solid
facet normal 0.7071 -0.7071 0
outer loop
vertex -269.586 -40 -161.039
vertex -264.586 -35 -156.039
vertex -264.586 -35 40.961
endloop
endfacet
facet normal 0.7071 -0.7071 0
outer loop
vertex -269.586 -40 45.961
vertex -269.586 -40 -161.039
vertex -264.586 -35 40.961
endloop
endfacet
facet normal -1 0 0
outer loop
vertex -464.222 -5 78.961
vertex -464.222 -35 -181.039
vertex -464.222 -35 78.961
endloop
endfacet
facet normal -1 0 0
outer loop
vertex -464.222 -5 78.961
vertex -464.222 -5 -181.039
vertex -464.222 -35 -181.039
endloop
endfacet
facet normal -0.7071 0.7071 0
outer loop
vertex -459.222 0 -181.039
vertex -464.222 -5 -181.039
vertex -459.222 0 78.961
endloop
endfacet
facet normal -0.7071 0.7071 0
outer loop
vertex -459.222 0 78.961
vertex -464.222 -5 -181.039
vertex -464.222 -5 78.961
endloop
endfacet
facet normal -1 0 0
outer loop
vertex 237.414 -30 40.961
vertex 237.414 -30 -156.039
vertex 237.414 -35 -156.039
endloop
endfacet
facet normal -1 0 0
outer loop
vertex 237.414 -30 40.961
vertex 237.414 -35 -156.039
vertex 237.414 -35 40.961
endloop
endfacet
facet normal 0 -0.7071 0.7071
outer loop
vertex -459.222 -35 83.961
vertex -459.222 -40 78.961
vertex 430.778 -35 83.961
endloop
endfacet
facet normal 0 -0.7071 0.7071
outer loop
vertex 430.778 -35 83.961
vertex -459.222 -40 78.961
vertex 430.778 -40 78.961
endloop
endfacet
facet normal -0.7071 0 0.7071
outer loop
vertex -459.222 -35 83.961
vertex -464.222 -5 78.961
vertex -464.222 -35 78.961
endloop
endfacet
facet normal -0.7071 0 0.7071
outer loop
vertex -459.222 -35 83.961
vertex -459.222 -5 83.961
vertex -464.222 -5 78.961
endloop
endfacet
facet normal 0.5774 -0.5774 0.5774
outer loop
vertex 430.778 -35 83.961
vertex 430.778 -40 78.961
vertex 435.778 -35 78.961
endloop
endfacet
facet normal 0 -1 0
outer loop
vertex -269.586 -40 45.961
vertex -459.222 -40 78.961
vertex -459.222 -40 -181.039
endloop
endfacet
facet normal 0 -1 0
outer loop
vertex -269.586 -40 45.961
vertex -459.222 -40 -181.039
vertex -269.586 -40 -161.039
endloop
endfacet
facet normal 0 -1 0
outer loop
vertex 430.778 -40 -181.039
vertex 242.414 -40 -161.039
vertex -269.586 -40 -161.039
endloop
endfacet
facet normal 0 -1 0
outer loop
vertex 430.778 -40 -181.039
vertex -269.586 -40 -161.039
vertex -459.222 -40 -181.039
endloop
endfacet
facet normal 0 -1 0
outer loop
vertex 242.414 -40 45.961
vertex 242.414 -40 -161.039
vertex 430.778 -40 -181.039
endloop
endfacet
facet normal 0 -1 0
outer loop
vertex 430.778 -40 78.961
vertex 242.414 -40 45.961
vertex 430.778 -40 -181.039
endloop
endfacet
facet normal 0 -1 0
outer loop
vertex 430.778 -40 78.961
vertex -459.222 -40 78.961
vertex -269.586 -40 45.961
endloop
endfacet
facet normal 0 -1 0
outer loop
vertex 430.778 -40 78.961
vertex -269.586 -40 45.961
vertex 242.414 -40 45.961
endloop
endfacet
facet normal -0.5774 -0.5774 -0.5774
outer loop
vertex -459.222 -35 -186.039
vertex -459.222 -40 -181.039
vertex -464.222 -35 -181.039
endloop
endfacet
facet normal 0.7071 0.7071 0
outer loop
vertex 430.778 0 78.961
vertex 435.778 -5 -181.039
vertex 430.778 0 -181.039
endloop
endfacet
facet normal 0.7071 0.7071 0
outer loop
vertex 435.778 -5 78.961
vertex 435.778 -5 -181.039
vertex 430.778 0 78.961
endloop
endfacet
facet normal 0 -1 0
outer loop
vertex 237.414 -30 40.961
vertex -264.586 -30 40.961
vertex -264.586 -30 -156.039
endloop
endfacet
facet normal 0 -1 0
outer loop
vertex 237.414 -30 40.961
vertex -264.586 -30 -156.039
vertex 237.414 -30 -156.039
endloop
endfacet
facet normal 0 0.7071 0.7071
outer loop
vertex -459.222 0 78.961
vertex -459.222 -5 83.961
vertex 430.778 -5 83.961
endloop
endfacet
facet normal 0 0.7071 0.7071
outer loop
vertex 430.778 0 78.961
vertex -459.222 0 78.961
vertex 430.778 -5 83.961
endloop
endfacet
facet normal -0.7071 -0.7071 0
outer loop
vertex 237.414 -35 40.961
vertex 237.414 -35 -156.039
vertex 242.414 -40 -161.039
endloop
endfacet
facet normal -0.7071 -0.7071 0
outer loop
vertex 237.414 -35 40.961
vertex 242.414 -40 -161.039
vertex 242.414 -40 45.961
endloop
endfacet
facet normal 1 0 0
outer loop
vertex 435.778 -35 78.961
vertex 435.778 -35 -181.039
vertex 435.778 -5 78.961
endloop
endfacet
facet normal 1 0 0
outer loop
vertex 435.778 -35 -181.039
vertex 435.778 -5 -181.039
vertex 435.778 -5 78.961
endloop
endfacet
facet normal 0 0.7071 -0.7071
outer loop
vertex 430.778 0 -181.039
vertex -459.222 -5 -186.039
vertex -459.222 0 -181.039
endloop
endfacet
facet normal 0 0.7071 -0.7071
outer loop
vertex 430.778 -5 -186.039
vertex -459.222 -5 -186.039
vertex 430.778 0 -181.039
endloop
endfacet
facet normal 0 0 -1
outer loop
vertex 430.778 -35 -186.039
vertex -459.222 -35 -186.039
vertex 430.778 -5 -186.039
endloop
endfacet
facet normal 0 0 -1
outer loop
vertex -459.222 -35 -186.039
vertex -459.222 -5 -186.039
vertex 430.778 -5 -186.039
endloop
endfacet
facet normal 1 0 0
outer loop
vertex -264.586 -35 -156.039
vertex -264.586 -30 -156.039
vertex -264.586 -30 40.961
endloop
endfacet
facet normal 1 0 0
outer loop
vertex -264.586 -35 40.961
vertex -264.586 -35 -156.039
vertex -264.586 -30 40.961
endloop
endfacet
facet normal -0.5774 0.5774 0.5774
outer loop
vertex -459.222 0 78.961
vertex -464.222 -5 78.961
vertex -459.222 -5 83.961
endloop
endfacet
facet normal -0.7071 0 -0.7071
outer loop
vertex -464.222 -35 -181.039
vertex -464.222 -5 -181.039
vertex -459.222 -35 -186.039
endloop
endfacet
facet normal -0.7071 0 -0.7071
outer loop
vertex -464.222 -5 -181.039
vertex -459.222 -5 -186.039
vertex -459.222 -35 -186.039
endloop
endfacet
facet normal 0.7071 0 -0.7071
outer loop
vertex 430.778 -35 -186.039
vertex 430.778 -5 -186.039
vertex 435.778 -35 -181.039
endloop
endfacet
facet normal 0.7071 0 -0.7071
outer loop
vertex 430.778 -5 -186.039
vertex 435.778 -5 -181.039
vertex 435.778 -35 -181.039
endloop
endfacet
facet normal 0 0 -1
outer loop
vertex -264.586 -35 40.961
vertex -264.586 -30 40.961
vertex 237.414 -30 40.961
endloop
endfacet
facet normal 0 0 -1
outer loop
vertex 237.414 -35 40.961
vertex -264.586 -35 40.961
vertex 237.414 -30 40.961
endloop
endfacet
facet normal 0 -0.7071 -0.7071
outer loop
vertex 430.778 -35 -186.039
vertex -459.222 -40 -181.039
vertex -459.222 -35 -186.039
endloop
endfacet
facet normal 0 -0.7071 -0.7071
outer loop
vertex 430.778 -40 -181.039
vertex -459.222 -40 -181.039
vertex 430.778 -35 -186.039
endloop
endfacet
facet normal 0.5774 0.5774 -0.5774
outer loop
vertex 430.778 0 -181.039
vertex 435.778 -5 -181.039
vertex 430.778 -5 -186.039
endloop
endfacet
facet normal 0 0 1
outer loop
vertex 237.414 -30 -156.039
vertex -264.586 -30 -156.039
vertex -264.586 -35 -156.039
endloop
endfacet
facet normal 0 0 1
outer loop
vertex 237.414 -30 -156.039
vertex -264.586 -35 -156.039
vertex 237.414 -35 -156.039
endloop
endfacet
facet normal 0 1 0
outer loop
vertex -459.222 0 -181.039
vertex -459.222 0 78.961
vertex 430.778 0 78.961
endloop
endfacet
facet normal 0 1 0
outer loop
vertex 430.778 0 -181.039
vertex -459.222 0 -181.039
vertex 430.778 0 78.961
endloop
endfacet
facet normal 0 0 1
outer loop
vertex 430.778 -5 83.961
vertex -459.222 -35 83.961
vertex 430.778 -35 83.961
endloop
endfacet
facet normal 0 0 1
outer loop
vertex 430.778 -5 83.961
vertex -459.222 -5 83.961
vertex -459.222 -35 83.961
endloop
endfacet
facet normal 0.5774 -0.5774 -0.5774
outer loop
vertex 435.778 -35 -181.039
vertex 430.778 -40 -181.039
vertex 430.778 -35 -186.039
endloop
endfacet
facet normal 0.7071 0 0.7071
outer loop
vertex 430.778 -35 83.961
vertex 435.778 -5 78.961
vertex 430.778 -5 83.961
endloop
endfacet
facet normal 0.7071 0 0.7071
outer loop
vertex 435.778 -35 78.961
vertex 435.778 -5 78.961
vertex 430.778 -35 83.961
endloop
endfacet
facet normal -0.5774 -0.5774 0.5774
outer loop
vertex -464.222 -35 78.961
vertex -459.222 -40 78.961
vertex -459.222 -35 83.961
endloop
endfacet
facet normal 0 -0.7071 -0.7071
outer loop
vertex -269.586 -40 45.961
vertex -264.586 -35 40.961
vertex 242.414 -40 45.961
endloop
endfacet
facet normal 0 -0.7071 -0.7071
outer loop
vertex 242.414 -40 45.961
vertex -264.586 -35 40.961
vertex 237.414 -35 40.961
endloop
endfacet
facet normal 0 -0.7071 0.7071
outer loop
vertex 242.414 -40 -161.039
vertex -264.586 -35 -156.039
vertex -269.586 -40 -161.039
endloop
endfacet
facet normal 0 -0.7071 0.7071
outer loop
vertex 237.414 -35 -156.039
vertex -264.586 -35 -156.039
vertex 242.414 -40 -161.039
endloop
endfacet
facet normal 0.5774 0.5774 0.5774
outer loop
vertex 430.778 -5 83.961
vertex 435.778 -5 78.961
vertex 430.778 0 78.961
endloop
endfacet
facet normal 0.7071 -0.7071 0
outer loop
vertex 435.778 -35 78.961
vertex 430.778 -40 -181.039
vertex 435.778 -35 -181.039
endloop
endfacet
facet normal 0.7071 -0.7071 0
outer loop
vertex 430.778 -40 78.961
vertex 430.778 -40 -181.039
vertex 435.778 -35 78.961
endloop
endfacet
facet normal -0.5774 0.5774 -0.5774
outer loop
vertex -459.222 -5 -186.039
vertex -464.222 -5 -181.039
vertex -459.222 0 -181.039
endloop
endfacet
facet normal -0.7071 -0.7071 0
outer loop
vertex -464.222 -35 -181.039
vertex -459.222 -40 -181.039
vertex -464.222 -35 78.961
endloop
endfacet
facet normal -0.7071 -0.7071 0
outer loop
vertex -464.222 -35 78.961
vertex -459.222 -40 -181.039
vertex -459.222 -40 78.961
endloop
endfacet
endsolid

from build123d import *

# Parameters (mm, degrees)
F0_W     = 900
F0_H     = 270
F0_W_2   = 502
F0_H_2   = 197
F1_DEPTH = 40
F2_DEPTH = 30
F3_SIZE  = 5


with BuildPart() as f1:
    # F0 (on Front) → F1 (new body)
    with BuildSketch(Plane.XZ):
        with Locations((-14.222194, -51.038729)):
            Rectangle(F0_W, F0_H)
        with Locations((-13.586061, -57.538729)):
            Rectangle(F0_W_2, F0_H_2, mode=Mode.SUBTRACT)
    extrude(amount=F1_DEPTH)

    # F0 (on Front) → F2 (join)
    with BuildSketch(Plane.XZ):
        with Locations((-13.586061, -57.538729)):
            Rectangle(F0_W_2, F0_H_2)
    extrude(amount=F2_DEPTH)

    # F3
    f3_edges = [f1.edges().sort_by_distance(p)[0] for p in [
        (435.777806, -40, -51.038729),
        (-14.222194, -40, 83.961271),
        (-464.222194, -40, -51.038729),
        (-14.222194, -40, -186.038729),
        (-264.586061, -40, -57.538729),
        (-13.586061, -40, 40.961271),
        (237.413939, -40, -57.538729),
        (-13.586061, -40, -156.038729),
        (-464.222194, -20, 83.961271),
        (-464.222194, -20, -186.038729),
        (-464.222194, 0, -51.038729),
        (435.777806, -20, -186.038729),
        (435.777806, -20, 83.961271),
        (435.777806, 0, -51.038729),
        (-14.222194, 0, -186.038729),
        (-14.222194, 0, 83.961271),
    ]]
    chamfer(f3_edges, length=F3_SIZE)


solid = f1.part
